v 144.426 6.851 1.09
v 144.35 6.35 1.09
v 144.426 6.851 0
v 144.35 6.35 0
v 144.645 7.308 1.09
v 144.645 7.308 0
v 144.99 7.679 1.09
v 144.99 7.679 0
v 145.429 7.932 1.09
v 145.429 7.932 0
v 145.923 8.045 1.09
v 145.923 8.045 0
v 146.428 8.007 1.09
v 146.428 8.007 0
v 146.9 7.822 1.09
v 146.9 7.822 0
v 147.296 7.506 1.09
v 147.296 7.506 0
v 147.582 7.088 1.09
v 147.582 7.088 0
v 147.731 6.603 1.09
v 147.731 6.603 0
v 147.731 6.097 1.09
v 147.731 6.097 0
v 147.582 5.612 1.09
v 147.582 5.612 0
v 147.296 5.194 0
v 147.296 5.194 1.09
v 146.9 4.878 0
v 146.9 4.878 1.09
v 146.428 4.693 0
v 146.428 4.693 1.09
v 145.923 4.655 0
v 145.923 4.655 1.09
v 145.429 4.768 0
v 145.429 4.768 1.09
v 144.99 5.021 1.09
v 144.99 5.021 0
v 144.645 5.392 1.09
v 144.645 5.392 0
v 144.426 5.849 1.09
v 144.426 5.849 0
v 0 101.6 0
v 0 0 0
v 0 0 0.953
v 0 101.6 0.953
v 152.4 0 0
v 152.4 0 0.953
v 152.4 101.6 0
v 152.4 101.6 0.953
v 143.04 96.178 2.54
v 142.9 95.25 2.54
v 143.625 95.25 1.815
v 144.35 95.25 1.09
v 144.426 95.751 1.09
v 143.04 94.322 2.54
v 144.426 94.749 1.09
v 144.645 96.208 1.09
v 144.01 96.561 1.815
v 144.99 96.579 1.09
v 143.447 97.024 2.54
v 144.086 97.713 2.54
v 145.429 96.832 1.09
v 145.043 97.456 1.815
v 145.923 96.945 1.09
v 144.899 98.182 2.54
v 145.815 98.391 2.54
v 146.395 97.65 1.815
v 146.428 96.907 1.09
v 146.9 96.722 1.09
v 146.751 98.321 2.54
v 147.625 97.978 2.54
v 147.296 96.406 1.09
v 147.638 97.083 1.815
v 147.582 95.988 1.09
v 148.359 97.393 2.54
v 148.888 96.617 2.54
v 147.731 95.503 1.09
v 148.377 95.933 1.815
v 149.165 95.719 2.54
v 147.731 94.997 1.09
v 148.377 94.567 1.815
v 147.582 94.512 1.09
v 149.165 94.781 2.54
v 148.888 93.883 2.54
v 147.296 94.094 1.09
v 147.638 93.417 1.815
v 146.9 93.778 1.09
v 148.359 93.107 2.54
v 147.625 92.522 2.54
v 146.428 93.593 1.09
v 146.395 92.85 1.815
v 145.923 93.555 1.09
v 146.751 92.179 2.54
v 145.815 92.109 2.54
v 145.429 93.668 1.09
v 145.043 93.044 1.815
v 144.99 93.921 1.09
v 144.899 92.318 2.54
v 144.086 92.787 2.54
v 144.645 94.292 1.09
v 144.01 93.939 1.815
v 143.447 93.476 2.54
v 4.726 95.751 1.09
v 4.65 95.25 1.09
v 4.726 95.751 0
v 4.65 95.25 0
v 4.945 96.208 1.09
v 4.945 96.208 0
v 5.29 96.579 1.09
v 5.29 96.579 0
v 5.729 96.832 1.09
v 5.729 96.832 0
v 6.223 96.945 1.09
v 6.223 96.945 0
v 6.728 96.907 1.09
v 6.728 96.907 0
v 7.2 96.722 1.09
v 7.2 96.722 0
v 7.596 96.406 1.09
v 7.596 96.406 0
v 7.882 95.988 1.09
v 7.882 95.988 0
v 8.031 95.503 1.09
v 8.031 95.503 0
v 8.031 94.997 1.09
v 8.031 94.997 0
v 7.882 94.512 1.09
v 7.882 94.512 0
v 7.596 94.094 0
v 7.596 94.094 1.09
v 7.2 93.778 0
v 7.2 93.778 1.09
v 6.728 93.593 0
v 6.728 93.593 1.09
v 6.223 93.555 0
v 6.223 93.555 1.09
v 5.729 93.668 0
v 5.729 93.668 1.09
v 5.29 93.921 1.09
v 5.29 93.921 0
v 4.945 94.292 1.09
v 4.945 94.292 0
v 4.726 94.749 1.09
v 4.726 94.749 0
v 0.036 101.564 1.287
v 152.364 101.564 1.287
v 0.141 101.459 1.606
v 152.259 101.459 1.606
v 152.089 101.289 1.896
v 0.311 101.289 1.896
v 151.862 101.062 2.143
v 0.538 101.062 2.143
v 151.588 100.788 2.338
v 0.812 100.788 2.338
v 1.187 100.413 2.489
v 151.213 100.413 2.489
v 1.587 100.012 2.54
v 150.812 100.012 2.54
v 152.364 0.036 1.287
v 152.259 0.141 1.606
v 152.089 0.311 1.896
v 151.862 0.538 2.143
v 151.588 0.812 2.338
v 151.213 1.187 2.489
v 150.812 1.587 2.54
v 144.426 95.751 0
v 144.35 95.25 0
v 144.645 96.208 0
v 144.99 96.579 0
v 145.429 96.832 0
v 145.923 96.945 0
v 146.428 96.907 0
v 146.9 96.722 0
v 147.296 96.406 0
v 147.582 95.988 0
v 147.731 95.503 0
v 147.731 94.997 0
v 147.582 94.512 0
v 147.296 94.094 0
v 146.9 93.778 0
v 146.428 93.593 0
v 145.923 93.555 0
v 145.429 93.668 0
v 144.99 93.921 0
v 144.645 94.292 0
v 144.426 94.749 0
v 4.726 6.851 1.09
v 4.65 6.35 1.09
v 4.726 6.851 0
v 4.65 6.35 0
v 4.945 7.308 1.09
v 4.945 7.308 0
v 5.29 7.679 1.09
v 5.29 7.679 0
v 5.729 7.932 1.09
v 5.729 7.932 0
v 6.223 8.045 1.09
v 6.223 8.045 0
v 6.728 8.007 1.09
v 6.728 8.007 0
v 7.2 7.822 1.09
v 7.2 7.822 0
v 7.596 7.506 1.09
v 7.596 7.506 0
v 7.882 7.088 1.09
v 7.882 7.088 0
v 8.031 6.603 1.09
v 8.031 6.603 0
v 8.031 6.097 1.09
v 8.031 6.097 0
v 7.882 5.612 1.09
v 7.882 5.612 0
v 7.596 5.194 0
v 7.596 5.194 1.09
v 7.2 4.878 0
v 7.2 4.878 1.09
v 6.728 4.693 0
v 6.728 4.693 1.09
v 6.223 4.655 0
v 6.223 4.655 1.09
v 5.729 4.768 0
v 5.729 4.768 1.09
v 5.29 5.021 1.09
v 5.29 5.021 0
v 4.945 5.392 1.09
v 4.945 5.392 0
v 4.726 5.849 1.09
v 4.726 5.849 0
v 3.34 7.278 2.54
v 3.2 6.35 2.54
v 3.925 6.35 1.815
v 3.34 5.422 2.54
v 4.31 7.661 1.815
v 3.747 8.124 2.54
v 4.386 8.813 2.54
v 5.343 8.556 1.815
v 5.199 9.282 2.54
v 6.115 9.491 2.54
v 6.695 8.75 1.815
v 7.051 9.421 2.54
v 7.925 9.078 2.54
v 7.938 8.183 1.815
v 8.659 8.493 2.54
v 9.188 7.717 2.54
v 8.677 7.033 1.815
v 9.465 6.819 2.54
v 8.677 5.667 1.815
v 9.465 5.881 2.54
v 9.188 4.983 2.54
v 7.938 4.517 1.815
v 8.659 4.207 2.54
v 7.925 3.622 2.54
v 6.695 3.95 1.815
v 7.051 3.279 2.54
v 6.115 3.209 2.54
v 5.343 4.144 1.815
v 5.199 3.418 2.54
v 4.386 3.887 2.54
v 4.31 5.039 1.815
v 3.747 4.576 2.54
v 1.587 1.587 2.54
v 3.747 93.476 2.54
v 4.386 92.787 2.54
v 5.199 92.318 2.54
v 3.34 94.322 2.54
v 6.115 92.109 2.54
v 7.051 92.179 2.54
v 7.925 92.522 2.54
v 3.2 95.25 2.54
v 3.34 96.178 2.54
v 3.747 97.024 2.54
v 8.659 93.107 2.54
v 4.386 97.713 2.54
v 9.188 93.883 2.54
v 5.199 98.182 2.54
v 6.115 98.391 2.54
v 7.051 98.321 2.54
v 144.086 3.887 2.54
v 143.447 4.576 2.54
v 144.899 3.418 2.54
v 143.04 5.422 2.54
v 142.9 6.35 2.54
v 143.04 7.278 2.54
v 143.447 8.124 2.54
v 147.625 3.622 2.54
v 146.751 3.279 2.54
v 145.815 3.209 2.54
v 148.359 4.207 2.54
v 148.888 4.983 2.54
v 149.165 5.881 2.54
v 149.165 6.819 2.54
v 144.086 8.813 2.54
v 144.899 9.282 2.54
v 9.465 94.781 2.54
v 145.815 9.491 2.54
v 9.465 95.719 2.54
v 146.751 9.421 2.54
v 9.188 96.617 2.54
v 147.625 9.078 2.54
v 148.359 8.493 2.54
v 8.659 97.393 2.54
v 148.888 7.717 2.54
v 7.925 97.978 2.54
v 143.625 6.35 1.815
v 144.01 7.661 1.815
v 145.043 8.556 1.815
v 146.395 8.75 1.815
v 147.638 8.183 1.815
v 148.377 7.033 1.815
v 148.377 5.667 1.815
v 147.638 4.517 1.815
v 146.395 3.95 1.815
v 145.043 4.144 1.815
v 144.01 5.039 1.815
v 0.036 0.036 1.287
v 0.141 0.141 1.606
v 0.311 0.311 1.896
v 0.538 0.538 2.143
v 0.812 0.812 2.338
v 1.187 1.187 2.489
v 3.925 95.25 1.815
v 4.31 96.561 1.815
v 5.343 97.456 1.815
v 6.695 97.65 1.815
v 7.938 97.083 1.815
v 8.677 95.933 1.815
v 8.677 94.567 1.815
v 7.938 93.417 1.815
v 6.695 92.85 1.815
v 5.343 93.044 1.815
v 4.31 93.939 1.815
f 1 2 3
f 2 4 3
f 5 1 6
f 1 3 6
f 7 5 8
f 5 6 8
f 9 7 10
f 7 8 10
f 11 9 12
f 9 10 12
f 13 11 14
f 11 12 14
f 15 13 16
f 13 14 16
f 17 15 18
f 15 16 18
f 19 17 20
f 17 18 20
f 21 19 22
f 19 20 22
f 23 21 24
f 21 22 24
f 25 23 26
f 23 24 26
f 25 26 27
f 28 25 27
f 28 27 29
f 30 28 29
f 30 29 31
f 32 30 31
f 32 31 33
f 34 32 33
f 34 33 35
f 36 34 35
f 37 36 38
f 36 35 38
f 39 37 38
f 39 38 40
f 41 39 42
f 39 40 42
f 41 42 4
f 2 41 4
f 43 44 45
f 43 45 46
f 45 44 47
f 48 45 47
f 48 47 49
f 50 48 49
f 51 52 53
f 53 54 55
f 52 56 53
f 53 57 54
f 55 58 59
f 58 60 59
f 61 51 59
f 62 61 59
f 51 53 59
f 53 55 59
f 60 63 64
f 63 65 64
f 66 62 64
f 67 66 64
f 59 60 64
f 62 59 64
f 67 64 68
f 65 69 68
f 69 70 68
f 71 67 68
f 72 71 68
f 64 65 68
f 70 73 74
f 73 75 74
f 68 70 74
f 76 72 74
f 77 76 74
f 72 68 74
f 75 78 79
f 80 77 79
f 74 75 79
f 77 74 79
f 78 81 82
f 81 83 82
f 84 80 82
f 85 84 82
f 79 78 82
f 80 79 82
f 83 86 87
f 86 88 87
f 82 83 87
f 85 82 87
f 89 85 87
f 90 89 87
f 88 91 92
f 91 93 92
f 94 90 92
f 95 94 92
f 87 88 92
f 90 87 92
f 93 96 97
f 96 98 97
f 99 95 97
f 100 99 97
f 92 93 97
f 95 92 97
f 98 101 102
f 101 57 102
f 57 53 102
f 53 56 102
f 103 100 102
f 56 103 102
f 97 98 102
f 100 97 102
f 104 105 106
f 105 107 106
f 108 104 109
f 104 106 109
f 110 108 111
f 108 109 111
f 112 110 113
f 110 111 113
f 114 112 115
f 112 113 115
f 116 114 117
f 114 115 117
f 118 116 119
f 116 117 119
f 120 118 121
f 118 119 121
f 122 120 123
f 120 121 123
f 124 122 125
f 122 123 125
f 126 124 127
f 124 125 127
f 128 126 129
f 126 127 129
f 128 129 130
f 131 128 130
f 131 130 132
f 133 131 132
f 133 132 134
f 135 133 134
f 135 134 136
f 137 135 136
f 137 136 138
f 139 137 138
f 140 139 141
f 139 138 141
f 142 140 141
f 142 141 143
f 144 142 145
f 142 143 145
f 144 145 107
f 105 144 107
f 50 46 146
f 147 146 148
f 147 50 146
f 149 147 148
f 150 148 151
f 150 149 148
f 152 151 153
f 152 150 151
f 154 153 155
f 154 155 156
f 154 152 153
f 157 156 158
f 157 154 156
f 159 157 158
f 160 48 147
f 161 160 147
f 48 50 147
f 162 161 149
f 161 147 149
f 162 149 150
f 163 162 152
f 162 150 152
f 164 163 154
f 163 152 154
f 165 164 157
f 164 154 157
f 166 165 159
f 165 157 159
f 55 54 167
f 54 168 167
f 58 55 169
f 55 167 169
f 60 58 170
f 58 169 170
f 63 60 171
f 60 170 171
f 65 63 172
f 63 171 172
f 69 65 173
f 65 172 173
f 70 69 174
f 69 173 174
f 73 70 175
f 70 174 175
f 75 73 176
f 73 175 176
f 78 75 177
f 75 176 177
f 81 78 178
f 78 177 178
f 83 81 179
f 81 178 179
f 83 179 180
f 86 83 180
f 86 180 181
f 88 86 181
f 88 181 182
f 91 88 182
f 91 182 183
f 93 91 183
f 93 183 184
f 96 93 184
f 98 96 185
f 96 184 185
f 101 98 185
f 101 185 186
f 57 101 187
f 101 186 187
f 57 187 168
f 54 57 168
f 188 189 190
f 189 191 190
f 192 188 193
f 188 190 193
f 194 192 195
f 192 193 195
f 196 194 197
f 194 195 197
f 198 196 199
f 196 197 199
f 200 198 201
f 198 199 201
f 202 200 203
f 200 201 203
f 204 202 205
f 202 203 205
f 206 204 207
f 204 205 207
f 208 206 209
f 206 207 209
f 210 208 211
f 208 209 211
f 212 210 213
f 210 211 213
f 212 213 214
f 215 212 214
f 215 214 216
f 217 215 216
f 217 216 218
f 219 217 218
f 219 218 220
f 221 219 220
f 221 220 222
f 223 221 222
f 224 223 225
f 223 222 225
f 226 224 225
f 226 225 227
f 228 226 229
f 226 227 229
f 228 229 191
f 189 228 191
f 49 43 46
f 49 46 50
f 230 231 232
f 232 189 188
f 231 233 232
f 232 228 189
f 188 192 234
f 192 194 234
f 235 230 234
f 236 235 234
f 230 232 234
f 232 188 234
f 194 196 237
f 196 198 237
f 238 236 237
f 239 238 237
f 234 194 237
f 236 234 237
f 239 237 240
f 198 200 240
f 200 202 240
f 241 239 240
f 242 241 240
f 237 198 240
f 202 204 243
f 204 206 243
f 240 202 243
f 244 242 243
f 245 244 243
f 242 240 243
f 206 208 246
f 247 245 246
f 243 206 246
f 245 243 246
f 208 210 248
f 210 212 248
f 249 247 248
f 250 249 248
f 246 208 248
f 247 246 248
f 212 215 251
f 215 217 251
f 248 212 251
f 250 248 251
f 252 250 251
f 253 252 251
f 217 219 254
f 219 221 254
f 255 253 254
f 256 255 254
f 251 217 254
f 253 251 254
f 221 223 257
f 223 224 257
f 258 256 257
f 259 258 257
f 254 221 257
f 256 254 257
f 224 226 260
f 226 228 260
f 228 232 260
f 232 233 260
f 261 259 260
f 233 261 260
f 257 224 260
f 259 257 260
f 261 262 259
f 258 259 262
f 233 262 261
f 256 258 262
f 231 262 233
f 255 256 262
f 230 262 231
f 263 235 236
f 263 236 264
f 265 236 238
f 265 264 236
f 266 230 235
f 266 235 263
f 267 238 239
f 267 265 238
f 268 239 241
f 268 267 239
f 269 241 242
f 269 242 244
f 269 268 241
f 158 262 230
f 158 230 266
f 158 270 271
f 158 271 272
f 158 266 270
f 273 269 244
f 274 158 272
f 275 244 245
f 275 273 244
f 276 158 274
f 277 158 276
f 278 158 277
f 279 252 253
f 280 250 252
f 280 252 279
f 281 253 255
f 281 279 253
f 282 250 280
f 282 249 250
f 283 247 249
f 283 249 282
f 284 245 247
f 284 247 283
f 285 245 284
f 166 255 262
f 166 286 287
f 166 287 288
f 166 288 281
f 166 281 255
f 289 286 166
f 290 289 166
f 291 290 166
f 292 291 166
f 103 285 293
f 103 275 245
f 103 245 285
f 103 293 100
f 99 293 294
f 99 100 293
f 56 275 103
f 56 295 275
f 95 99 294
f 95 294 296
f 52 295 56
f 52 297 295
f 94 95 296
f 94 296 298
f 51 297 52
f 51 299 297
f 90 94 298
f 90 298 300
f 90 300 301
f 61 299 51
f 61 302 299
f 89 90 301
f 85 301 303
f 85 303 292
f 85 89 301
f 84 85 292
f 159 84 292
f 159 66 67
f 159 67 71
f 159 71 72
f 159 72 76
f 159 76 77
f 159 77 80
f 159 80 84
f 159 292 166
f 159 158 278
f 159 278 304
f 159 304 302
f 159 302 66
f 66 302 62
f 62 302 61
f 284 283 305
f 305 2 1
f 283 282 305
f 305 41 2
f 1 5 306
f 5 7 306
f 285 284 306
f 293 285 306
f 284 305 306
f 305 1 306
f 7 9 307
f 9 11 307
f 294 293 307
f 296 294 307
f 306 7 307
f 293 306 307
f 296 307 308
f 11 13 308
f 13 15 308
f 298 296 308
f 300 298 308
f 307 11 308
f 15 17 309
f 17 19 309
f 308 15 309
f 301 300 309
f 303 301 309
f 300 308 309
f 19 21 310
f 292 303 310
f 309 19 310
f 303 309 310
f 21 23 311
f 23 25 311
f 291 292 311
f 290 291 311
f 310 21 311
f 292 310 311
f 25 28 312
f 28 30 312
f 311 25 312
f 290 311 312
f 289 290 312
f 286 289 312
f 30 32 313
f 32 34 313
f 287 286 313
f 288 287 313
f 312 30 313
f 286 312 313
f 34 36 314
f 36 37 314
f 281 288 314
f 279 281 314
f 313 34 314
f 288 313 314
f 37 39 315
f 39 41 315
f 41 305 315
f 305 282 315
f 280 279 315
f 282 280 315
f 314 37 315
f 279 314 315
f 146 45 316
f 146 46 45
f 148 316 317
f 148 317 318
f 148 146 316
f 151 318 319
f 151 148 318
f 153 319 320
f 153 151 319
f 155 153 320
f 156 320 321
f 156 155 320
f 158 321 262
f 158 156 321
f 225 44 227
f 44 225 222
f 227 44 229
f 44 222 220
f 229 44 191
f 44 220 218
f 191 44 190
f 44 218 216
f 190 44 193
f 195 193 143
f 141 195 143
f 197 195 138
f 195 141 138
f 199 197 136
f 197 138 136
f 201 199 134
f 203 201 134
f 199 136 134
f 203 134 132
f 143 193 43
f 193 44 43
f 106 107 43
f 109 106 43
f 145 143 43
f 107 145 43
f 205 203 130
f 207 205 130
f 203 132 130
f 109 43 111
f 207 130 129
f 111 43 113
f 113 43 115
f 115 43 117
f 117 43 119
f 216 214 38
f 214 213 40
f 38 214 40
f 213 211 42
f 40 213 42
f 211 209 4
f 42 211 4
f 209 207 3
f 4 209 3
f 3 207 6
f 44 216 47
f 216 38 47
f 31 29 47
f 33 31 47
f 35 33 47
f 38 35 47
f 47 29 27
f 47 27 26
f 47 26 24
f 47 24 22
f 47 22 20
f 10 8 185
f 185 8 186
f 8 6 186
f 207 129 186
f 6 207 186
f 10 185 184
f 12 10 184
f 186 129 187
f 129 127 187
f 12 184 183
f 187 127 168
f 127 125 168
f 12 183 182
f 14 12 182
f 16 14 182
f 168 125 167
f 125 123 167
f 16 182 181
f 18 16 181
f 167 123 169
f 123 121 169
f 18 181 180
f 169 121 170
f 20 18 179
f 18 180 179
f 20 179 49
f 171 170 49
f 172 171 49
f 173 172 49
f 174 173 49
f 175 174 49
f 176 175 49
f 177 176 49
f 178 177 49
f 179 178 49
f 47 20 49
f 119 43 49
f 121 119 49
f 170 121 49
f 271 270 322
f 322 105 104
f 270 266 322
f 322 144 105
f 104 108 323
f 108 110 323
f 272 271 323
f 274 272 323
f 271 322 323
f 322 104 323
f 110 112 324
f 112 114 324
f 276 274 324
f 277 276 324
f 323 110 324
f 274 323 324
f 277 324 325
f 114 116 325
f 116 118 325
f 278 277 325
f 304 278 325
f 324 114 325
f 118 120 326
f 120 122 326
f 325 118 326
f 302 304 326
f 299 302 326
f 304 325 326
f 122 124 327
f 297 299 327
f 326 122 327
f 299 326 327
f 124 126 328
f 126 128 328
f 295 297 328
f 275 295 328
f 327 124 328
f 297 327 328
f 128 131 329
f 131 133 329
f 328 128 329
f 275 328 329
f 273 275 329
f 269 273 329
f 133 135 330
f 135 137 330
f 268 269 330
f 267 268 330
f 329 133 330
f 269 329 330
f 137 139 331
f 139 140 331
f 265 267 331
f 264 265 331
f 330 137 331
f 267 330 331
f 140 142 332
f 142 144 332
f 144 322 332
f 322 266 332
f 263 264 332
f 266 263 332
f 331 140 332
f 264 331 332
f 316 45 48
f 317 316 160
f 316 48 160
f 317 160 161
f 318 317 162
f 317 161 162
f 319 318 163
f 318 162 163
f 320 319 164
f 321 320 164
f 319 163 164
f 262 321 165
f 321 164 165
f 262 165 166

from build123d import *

# Parameters (mm, degrees)
SKETCH1_W                                       = 152.4
SKETCH1_H                                       = 101.6
BOSS_EXTRUDE1_DEPTH                             = 2.54
FILLET1_R                                       = 1.5875
CSK_FOR_M3_FLAT_HEAD_MACHINE_SCREW1_D           = 3.4
CSK_FOR_M3_FLAT_HEAD_MACHINE_SCREW1_DEPTH       = 6.35
CSK_FOR_M3_FLAT_HEAD_MACHINE_SCREW1_CSINK_D     = 6.3
CSK_FOR_M3_FLAT_HEAD_MACHINE_SCREW1_CSINK_ANGLE = 90
CSK_FOR_M3_FLAT_HEAD_MACHINE_SCREW1_TIP         = 1.021463052


with BuildPart() as part:
    # Sketch1 → Boss-Extrude1 (new body)
    with BuildSketch(Plane.XY):
        with Locations((76.2, 50.8)):
            Rectangle(SKETCH1_W, SKETCH1_H)
    extrude(amount=BOSS_EXTRUDE1_DEPTH)

    # Fillet1
    fillet1_edges = [part.edges().sort_by_distance(p)[0] for p in [
        (152.4, 50.8, 2.54),
        (76.2, 101.6, 2.54),
        (0, 50.8, 2.54),
        (76.2, 0, 2.54),
    ]]
    fillet(fillet1_edges, radius=FILLET1_R)

    # CSK for M3 Flat Head Machine Screw1
    with Locations(Plane.XY.offset(2.54)):
        with Locations((6.35, 95.25), (6.35, 6.35), (146.05, 6.35), (146.05, 95.25)):
            CounterSinkHole(CSK_FOR_M3_FLAT_HEAD_MACHINE_SCREW1_D / 2, CSK_FOR_M3_FLAT_HEAD_MACHINE_SCREW1_CSINK_D / 2, depth=CSK_FOR_M3_FLAT_HEAD_MACHINE_SCREW1_DEPTH, counter_sink_angle=CSK_FOR_M3_FLAT_HEAD_MACHINE_SCREW1_CSINK_ANGLE)
            with Locations((0, 0, -(CSK_FOR_M3_FLAT_HEAD_MACHINE_SCREW1_DEPTH + CSK_FOR_M3_FLAT_HEAD_MACHINE_SCREW1_TIP / 2))):  # 118° drill point
                Cone(0, CSK_FOR_M3_FLAT_HEAD_MACHINE_SCREW1_D / 2, CSK_FOR_M3_FLAT_HEAD_MACHINE_SCREW1_TIP, mode=Mode.SUBTRACT)


solid = part.part
